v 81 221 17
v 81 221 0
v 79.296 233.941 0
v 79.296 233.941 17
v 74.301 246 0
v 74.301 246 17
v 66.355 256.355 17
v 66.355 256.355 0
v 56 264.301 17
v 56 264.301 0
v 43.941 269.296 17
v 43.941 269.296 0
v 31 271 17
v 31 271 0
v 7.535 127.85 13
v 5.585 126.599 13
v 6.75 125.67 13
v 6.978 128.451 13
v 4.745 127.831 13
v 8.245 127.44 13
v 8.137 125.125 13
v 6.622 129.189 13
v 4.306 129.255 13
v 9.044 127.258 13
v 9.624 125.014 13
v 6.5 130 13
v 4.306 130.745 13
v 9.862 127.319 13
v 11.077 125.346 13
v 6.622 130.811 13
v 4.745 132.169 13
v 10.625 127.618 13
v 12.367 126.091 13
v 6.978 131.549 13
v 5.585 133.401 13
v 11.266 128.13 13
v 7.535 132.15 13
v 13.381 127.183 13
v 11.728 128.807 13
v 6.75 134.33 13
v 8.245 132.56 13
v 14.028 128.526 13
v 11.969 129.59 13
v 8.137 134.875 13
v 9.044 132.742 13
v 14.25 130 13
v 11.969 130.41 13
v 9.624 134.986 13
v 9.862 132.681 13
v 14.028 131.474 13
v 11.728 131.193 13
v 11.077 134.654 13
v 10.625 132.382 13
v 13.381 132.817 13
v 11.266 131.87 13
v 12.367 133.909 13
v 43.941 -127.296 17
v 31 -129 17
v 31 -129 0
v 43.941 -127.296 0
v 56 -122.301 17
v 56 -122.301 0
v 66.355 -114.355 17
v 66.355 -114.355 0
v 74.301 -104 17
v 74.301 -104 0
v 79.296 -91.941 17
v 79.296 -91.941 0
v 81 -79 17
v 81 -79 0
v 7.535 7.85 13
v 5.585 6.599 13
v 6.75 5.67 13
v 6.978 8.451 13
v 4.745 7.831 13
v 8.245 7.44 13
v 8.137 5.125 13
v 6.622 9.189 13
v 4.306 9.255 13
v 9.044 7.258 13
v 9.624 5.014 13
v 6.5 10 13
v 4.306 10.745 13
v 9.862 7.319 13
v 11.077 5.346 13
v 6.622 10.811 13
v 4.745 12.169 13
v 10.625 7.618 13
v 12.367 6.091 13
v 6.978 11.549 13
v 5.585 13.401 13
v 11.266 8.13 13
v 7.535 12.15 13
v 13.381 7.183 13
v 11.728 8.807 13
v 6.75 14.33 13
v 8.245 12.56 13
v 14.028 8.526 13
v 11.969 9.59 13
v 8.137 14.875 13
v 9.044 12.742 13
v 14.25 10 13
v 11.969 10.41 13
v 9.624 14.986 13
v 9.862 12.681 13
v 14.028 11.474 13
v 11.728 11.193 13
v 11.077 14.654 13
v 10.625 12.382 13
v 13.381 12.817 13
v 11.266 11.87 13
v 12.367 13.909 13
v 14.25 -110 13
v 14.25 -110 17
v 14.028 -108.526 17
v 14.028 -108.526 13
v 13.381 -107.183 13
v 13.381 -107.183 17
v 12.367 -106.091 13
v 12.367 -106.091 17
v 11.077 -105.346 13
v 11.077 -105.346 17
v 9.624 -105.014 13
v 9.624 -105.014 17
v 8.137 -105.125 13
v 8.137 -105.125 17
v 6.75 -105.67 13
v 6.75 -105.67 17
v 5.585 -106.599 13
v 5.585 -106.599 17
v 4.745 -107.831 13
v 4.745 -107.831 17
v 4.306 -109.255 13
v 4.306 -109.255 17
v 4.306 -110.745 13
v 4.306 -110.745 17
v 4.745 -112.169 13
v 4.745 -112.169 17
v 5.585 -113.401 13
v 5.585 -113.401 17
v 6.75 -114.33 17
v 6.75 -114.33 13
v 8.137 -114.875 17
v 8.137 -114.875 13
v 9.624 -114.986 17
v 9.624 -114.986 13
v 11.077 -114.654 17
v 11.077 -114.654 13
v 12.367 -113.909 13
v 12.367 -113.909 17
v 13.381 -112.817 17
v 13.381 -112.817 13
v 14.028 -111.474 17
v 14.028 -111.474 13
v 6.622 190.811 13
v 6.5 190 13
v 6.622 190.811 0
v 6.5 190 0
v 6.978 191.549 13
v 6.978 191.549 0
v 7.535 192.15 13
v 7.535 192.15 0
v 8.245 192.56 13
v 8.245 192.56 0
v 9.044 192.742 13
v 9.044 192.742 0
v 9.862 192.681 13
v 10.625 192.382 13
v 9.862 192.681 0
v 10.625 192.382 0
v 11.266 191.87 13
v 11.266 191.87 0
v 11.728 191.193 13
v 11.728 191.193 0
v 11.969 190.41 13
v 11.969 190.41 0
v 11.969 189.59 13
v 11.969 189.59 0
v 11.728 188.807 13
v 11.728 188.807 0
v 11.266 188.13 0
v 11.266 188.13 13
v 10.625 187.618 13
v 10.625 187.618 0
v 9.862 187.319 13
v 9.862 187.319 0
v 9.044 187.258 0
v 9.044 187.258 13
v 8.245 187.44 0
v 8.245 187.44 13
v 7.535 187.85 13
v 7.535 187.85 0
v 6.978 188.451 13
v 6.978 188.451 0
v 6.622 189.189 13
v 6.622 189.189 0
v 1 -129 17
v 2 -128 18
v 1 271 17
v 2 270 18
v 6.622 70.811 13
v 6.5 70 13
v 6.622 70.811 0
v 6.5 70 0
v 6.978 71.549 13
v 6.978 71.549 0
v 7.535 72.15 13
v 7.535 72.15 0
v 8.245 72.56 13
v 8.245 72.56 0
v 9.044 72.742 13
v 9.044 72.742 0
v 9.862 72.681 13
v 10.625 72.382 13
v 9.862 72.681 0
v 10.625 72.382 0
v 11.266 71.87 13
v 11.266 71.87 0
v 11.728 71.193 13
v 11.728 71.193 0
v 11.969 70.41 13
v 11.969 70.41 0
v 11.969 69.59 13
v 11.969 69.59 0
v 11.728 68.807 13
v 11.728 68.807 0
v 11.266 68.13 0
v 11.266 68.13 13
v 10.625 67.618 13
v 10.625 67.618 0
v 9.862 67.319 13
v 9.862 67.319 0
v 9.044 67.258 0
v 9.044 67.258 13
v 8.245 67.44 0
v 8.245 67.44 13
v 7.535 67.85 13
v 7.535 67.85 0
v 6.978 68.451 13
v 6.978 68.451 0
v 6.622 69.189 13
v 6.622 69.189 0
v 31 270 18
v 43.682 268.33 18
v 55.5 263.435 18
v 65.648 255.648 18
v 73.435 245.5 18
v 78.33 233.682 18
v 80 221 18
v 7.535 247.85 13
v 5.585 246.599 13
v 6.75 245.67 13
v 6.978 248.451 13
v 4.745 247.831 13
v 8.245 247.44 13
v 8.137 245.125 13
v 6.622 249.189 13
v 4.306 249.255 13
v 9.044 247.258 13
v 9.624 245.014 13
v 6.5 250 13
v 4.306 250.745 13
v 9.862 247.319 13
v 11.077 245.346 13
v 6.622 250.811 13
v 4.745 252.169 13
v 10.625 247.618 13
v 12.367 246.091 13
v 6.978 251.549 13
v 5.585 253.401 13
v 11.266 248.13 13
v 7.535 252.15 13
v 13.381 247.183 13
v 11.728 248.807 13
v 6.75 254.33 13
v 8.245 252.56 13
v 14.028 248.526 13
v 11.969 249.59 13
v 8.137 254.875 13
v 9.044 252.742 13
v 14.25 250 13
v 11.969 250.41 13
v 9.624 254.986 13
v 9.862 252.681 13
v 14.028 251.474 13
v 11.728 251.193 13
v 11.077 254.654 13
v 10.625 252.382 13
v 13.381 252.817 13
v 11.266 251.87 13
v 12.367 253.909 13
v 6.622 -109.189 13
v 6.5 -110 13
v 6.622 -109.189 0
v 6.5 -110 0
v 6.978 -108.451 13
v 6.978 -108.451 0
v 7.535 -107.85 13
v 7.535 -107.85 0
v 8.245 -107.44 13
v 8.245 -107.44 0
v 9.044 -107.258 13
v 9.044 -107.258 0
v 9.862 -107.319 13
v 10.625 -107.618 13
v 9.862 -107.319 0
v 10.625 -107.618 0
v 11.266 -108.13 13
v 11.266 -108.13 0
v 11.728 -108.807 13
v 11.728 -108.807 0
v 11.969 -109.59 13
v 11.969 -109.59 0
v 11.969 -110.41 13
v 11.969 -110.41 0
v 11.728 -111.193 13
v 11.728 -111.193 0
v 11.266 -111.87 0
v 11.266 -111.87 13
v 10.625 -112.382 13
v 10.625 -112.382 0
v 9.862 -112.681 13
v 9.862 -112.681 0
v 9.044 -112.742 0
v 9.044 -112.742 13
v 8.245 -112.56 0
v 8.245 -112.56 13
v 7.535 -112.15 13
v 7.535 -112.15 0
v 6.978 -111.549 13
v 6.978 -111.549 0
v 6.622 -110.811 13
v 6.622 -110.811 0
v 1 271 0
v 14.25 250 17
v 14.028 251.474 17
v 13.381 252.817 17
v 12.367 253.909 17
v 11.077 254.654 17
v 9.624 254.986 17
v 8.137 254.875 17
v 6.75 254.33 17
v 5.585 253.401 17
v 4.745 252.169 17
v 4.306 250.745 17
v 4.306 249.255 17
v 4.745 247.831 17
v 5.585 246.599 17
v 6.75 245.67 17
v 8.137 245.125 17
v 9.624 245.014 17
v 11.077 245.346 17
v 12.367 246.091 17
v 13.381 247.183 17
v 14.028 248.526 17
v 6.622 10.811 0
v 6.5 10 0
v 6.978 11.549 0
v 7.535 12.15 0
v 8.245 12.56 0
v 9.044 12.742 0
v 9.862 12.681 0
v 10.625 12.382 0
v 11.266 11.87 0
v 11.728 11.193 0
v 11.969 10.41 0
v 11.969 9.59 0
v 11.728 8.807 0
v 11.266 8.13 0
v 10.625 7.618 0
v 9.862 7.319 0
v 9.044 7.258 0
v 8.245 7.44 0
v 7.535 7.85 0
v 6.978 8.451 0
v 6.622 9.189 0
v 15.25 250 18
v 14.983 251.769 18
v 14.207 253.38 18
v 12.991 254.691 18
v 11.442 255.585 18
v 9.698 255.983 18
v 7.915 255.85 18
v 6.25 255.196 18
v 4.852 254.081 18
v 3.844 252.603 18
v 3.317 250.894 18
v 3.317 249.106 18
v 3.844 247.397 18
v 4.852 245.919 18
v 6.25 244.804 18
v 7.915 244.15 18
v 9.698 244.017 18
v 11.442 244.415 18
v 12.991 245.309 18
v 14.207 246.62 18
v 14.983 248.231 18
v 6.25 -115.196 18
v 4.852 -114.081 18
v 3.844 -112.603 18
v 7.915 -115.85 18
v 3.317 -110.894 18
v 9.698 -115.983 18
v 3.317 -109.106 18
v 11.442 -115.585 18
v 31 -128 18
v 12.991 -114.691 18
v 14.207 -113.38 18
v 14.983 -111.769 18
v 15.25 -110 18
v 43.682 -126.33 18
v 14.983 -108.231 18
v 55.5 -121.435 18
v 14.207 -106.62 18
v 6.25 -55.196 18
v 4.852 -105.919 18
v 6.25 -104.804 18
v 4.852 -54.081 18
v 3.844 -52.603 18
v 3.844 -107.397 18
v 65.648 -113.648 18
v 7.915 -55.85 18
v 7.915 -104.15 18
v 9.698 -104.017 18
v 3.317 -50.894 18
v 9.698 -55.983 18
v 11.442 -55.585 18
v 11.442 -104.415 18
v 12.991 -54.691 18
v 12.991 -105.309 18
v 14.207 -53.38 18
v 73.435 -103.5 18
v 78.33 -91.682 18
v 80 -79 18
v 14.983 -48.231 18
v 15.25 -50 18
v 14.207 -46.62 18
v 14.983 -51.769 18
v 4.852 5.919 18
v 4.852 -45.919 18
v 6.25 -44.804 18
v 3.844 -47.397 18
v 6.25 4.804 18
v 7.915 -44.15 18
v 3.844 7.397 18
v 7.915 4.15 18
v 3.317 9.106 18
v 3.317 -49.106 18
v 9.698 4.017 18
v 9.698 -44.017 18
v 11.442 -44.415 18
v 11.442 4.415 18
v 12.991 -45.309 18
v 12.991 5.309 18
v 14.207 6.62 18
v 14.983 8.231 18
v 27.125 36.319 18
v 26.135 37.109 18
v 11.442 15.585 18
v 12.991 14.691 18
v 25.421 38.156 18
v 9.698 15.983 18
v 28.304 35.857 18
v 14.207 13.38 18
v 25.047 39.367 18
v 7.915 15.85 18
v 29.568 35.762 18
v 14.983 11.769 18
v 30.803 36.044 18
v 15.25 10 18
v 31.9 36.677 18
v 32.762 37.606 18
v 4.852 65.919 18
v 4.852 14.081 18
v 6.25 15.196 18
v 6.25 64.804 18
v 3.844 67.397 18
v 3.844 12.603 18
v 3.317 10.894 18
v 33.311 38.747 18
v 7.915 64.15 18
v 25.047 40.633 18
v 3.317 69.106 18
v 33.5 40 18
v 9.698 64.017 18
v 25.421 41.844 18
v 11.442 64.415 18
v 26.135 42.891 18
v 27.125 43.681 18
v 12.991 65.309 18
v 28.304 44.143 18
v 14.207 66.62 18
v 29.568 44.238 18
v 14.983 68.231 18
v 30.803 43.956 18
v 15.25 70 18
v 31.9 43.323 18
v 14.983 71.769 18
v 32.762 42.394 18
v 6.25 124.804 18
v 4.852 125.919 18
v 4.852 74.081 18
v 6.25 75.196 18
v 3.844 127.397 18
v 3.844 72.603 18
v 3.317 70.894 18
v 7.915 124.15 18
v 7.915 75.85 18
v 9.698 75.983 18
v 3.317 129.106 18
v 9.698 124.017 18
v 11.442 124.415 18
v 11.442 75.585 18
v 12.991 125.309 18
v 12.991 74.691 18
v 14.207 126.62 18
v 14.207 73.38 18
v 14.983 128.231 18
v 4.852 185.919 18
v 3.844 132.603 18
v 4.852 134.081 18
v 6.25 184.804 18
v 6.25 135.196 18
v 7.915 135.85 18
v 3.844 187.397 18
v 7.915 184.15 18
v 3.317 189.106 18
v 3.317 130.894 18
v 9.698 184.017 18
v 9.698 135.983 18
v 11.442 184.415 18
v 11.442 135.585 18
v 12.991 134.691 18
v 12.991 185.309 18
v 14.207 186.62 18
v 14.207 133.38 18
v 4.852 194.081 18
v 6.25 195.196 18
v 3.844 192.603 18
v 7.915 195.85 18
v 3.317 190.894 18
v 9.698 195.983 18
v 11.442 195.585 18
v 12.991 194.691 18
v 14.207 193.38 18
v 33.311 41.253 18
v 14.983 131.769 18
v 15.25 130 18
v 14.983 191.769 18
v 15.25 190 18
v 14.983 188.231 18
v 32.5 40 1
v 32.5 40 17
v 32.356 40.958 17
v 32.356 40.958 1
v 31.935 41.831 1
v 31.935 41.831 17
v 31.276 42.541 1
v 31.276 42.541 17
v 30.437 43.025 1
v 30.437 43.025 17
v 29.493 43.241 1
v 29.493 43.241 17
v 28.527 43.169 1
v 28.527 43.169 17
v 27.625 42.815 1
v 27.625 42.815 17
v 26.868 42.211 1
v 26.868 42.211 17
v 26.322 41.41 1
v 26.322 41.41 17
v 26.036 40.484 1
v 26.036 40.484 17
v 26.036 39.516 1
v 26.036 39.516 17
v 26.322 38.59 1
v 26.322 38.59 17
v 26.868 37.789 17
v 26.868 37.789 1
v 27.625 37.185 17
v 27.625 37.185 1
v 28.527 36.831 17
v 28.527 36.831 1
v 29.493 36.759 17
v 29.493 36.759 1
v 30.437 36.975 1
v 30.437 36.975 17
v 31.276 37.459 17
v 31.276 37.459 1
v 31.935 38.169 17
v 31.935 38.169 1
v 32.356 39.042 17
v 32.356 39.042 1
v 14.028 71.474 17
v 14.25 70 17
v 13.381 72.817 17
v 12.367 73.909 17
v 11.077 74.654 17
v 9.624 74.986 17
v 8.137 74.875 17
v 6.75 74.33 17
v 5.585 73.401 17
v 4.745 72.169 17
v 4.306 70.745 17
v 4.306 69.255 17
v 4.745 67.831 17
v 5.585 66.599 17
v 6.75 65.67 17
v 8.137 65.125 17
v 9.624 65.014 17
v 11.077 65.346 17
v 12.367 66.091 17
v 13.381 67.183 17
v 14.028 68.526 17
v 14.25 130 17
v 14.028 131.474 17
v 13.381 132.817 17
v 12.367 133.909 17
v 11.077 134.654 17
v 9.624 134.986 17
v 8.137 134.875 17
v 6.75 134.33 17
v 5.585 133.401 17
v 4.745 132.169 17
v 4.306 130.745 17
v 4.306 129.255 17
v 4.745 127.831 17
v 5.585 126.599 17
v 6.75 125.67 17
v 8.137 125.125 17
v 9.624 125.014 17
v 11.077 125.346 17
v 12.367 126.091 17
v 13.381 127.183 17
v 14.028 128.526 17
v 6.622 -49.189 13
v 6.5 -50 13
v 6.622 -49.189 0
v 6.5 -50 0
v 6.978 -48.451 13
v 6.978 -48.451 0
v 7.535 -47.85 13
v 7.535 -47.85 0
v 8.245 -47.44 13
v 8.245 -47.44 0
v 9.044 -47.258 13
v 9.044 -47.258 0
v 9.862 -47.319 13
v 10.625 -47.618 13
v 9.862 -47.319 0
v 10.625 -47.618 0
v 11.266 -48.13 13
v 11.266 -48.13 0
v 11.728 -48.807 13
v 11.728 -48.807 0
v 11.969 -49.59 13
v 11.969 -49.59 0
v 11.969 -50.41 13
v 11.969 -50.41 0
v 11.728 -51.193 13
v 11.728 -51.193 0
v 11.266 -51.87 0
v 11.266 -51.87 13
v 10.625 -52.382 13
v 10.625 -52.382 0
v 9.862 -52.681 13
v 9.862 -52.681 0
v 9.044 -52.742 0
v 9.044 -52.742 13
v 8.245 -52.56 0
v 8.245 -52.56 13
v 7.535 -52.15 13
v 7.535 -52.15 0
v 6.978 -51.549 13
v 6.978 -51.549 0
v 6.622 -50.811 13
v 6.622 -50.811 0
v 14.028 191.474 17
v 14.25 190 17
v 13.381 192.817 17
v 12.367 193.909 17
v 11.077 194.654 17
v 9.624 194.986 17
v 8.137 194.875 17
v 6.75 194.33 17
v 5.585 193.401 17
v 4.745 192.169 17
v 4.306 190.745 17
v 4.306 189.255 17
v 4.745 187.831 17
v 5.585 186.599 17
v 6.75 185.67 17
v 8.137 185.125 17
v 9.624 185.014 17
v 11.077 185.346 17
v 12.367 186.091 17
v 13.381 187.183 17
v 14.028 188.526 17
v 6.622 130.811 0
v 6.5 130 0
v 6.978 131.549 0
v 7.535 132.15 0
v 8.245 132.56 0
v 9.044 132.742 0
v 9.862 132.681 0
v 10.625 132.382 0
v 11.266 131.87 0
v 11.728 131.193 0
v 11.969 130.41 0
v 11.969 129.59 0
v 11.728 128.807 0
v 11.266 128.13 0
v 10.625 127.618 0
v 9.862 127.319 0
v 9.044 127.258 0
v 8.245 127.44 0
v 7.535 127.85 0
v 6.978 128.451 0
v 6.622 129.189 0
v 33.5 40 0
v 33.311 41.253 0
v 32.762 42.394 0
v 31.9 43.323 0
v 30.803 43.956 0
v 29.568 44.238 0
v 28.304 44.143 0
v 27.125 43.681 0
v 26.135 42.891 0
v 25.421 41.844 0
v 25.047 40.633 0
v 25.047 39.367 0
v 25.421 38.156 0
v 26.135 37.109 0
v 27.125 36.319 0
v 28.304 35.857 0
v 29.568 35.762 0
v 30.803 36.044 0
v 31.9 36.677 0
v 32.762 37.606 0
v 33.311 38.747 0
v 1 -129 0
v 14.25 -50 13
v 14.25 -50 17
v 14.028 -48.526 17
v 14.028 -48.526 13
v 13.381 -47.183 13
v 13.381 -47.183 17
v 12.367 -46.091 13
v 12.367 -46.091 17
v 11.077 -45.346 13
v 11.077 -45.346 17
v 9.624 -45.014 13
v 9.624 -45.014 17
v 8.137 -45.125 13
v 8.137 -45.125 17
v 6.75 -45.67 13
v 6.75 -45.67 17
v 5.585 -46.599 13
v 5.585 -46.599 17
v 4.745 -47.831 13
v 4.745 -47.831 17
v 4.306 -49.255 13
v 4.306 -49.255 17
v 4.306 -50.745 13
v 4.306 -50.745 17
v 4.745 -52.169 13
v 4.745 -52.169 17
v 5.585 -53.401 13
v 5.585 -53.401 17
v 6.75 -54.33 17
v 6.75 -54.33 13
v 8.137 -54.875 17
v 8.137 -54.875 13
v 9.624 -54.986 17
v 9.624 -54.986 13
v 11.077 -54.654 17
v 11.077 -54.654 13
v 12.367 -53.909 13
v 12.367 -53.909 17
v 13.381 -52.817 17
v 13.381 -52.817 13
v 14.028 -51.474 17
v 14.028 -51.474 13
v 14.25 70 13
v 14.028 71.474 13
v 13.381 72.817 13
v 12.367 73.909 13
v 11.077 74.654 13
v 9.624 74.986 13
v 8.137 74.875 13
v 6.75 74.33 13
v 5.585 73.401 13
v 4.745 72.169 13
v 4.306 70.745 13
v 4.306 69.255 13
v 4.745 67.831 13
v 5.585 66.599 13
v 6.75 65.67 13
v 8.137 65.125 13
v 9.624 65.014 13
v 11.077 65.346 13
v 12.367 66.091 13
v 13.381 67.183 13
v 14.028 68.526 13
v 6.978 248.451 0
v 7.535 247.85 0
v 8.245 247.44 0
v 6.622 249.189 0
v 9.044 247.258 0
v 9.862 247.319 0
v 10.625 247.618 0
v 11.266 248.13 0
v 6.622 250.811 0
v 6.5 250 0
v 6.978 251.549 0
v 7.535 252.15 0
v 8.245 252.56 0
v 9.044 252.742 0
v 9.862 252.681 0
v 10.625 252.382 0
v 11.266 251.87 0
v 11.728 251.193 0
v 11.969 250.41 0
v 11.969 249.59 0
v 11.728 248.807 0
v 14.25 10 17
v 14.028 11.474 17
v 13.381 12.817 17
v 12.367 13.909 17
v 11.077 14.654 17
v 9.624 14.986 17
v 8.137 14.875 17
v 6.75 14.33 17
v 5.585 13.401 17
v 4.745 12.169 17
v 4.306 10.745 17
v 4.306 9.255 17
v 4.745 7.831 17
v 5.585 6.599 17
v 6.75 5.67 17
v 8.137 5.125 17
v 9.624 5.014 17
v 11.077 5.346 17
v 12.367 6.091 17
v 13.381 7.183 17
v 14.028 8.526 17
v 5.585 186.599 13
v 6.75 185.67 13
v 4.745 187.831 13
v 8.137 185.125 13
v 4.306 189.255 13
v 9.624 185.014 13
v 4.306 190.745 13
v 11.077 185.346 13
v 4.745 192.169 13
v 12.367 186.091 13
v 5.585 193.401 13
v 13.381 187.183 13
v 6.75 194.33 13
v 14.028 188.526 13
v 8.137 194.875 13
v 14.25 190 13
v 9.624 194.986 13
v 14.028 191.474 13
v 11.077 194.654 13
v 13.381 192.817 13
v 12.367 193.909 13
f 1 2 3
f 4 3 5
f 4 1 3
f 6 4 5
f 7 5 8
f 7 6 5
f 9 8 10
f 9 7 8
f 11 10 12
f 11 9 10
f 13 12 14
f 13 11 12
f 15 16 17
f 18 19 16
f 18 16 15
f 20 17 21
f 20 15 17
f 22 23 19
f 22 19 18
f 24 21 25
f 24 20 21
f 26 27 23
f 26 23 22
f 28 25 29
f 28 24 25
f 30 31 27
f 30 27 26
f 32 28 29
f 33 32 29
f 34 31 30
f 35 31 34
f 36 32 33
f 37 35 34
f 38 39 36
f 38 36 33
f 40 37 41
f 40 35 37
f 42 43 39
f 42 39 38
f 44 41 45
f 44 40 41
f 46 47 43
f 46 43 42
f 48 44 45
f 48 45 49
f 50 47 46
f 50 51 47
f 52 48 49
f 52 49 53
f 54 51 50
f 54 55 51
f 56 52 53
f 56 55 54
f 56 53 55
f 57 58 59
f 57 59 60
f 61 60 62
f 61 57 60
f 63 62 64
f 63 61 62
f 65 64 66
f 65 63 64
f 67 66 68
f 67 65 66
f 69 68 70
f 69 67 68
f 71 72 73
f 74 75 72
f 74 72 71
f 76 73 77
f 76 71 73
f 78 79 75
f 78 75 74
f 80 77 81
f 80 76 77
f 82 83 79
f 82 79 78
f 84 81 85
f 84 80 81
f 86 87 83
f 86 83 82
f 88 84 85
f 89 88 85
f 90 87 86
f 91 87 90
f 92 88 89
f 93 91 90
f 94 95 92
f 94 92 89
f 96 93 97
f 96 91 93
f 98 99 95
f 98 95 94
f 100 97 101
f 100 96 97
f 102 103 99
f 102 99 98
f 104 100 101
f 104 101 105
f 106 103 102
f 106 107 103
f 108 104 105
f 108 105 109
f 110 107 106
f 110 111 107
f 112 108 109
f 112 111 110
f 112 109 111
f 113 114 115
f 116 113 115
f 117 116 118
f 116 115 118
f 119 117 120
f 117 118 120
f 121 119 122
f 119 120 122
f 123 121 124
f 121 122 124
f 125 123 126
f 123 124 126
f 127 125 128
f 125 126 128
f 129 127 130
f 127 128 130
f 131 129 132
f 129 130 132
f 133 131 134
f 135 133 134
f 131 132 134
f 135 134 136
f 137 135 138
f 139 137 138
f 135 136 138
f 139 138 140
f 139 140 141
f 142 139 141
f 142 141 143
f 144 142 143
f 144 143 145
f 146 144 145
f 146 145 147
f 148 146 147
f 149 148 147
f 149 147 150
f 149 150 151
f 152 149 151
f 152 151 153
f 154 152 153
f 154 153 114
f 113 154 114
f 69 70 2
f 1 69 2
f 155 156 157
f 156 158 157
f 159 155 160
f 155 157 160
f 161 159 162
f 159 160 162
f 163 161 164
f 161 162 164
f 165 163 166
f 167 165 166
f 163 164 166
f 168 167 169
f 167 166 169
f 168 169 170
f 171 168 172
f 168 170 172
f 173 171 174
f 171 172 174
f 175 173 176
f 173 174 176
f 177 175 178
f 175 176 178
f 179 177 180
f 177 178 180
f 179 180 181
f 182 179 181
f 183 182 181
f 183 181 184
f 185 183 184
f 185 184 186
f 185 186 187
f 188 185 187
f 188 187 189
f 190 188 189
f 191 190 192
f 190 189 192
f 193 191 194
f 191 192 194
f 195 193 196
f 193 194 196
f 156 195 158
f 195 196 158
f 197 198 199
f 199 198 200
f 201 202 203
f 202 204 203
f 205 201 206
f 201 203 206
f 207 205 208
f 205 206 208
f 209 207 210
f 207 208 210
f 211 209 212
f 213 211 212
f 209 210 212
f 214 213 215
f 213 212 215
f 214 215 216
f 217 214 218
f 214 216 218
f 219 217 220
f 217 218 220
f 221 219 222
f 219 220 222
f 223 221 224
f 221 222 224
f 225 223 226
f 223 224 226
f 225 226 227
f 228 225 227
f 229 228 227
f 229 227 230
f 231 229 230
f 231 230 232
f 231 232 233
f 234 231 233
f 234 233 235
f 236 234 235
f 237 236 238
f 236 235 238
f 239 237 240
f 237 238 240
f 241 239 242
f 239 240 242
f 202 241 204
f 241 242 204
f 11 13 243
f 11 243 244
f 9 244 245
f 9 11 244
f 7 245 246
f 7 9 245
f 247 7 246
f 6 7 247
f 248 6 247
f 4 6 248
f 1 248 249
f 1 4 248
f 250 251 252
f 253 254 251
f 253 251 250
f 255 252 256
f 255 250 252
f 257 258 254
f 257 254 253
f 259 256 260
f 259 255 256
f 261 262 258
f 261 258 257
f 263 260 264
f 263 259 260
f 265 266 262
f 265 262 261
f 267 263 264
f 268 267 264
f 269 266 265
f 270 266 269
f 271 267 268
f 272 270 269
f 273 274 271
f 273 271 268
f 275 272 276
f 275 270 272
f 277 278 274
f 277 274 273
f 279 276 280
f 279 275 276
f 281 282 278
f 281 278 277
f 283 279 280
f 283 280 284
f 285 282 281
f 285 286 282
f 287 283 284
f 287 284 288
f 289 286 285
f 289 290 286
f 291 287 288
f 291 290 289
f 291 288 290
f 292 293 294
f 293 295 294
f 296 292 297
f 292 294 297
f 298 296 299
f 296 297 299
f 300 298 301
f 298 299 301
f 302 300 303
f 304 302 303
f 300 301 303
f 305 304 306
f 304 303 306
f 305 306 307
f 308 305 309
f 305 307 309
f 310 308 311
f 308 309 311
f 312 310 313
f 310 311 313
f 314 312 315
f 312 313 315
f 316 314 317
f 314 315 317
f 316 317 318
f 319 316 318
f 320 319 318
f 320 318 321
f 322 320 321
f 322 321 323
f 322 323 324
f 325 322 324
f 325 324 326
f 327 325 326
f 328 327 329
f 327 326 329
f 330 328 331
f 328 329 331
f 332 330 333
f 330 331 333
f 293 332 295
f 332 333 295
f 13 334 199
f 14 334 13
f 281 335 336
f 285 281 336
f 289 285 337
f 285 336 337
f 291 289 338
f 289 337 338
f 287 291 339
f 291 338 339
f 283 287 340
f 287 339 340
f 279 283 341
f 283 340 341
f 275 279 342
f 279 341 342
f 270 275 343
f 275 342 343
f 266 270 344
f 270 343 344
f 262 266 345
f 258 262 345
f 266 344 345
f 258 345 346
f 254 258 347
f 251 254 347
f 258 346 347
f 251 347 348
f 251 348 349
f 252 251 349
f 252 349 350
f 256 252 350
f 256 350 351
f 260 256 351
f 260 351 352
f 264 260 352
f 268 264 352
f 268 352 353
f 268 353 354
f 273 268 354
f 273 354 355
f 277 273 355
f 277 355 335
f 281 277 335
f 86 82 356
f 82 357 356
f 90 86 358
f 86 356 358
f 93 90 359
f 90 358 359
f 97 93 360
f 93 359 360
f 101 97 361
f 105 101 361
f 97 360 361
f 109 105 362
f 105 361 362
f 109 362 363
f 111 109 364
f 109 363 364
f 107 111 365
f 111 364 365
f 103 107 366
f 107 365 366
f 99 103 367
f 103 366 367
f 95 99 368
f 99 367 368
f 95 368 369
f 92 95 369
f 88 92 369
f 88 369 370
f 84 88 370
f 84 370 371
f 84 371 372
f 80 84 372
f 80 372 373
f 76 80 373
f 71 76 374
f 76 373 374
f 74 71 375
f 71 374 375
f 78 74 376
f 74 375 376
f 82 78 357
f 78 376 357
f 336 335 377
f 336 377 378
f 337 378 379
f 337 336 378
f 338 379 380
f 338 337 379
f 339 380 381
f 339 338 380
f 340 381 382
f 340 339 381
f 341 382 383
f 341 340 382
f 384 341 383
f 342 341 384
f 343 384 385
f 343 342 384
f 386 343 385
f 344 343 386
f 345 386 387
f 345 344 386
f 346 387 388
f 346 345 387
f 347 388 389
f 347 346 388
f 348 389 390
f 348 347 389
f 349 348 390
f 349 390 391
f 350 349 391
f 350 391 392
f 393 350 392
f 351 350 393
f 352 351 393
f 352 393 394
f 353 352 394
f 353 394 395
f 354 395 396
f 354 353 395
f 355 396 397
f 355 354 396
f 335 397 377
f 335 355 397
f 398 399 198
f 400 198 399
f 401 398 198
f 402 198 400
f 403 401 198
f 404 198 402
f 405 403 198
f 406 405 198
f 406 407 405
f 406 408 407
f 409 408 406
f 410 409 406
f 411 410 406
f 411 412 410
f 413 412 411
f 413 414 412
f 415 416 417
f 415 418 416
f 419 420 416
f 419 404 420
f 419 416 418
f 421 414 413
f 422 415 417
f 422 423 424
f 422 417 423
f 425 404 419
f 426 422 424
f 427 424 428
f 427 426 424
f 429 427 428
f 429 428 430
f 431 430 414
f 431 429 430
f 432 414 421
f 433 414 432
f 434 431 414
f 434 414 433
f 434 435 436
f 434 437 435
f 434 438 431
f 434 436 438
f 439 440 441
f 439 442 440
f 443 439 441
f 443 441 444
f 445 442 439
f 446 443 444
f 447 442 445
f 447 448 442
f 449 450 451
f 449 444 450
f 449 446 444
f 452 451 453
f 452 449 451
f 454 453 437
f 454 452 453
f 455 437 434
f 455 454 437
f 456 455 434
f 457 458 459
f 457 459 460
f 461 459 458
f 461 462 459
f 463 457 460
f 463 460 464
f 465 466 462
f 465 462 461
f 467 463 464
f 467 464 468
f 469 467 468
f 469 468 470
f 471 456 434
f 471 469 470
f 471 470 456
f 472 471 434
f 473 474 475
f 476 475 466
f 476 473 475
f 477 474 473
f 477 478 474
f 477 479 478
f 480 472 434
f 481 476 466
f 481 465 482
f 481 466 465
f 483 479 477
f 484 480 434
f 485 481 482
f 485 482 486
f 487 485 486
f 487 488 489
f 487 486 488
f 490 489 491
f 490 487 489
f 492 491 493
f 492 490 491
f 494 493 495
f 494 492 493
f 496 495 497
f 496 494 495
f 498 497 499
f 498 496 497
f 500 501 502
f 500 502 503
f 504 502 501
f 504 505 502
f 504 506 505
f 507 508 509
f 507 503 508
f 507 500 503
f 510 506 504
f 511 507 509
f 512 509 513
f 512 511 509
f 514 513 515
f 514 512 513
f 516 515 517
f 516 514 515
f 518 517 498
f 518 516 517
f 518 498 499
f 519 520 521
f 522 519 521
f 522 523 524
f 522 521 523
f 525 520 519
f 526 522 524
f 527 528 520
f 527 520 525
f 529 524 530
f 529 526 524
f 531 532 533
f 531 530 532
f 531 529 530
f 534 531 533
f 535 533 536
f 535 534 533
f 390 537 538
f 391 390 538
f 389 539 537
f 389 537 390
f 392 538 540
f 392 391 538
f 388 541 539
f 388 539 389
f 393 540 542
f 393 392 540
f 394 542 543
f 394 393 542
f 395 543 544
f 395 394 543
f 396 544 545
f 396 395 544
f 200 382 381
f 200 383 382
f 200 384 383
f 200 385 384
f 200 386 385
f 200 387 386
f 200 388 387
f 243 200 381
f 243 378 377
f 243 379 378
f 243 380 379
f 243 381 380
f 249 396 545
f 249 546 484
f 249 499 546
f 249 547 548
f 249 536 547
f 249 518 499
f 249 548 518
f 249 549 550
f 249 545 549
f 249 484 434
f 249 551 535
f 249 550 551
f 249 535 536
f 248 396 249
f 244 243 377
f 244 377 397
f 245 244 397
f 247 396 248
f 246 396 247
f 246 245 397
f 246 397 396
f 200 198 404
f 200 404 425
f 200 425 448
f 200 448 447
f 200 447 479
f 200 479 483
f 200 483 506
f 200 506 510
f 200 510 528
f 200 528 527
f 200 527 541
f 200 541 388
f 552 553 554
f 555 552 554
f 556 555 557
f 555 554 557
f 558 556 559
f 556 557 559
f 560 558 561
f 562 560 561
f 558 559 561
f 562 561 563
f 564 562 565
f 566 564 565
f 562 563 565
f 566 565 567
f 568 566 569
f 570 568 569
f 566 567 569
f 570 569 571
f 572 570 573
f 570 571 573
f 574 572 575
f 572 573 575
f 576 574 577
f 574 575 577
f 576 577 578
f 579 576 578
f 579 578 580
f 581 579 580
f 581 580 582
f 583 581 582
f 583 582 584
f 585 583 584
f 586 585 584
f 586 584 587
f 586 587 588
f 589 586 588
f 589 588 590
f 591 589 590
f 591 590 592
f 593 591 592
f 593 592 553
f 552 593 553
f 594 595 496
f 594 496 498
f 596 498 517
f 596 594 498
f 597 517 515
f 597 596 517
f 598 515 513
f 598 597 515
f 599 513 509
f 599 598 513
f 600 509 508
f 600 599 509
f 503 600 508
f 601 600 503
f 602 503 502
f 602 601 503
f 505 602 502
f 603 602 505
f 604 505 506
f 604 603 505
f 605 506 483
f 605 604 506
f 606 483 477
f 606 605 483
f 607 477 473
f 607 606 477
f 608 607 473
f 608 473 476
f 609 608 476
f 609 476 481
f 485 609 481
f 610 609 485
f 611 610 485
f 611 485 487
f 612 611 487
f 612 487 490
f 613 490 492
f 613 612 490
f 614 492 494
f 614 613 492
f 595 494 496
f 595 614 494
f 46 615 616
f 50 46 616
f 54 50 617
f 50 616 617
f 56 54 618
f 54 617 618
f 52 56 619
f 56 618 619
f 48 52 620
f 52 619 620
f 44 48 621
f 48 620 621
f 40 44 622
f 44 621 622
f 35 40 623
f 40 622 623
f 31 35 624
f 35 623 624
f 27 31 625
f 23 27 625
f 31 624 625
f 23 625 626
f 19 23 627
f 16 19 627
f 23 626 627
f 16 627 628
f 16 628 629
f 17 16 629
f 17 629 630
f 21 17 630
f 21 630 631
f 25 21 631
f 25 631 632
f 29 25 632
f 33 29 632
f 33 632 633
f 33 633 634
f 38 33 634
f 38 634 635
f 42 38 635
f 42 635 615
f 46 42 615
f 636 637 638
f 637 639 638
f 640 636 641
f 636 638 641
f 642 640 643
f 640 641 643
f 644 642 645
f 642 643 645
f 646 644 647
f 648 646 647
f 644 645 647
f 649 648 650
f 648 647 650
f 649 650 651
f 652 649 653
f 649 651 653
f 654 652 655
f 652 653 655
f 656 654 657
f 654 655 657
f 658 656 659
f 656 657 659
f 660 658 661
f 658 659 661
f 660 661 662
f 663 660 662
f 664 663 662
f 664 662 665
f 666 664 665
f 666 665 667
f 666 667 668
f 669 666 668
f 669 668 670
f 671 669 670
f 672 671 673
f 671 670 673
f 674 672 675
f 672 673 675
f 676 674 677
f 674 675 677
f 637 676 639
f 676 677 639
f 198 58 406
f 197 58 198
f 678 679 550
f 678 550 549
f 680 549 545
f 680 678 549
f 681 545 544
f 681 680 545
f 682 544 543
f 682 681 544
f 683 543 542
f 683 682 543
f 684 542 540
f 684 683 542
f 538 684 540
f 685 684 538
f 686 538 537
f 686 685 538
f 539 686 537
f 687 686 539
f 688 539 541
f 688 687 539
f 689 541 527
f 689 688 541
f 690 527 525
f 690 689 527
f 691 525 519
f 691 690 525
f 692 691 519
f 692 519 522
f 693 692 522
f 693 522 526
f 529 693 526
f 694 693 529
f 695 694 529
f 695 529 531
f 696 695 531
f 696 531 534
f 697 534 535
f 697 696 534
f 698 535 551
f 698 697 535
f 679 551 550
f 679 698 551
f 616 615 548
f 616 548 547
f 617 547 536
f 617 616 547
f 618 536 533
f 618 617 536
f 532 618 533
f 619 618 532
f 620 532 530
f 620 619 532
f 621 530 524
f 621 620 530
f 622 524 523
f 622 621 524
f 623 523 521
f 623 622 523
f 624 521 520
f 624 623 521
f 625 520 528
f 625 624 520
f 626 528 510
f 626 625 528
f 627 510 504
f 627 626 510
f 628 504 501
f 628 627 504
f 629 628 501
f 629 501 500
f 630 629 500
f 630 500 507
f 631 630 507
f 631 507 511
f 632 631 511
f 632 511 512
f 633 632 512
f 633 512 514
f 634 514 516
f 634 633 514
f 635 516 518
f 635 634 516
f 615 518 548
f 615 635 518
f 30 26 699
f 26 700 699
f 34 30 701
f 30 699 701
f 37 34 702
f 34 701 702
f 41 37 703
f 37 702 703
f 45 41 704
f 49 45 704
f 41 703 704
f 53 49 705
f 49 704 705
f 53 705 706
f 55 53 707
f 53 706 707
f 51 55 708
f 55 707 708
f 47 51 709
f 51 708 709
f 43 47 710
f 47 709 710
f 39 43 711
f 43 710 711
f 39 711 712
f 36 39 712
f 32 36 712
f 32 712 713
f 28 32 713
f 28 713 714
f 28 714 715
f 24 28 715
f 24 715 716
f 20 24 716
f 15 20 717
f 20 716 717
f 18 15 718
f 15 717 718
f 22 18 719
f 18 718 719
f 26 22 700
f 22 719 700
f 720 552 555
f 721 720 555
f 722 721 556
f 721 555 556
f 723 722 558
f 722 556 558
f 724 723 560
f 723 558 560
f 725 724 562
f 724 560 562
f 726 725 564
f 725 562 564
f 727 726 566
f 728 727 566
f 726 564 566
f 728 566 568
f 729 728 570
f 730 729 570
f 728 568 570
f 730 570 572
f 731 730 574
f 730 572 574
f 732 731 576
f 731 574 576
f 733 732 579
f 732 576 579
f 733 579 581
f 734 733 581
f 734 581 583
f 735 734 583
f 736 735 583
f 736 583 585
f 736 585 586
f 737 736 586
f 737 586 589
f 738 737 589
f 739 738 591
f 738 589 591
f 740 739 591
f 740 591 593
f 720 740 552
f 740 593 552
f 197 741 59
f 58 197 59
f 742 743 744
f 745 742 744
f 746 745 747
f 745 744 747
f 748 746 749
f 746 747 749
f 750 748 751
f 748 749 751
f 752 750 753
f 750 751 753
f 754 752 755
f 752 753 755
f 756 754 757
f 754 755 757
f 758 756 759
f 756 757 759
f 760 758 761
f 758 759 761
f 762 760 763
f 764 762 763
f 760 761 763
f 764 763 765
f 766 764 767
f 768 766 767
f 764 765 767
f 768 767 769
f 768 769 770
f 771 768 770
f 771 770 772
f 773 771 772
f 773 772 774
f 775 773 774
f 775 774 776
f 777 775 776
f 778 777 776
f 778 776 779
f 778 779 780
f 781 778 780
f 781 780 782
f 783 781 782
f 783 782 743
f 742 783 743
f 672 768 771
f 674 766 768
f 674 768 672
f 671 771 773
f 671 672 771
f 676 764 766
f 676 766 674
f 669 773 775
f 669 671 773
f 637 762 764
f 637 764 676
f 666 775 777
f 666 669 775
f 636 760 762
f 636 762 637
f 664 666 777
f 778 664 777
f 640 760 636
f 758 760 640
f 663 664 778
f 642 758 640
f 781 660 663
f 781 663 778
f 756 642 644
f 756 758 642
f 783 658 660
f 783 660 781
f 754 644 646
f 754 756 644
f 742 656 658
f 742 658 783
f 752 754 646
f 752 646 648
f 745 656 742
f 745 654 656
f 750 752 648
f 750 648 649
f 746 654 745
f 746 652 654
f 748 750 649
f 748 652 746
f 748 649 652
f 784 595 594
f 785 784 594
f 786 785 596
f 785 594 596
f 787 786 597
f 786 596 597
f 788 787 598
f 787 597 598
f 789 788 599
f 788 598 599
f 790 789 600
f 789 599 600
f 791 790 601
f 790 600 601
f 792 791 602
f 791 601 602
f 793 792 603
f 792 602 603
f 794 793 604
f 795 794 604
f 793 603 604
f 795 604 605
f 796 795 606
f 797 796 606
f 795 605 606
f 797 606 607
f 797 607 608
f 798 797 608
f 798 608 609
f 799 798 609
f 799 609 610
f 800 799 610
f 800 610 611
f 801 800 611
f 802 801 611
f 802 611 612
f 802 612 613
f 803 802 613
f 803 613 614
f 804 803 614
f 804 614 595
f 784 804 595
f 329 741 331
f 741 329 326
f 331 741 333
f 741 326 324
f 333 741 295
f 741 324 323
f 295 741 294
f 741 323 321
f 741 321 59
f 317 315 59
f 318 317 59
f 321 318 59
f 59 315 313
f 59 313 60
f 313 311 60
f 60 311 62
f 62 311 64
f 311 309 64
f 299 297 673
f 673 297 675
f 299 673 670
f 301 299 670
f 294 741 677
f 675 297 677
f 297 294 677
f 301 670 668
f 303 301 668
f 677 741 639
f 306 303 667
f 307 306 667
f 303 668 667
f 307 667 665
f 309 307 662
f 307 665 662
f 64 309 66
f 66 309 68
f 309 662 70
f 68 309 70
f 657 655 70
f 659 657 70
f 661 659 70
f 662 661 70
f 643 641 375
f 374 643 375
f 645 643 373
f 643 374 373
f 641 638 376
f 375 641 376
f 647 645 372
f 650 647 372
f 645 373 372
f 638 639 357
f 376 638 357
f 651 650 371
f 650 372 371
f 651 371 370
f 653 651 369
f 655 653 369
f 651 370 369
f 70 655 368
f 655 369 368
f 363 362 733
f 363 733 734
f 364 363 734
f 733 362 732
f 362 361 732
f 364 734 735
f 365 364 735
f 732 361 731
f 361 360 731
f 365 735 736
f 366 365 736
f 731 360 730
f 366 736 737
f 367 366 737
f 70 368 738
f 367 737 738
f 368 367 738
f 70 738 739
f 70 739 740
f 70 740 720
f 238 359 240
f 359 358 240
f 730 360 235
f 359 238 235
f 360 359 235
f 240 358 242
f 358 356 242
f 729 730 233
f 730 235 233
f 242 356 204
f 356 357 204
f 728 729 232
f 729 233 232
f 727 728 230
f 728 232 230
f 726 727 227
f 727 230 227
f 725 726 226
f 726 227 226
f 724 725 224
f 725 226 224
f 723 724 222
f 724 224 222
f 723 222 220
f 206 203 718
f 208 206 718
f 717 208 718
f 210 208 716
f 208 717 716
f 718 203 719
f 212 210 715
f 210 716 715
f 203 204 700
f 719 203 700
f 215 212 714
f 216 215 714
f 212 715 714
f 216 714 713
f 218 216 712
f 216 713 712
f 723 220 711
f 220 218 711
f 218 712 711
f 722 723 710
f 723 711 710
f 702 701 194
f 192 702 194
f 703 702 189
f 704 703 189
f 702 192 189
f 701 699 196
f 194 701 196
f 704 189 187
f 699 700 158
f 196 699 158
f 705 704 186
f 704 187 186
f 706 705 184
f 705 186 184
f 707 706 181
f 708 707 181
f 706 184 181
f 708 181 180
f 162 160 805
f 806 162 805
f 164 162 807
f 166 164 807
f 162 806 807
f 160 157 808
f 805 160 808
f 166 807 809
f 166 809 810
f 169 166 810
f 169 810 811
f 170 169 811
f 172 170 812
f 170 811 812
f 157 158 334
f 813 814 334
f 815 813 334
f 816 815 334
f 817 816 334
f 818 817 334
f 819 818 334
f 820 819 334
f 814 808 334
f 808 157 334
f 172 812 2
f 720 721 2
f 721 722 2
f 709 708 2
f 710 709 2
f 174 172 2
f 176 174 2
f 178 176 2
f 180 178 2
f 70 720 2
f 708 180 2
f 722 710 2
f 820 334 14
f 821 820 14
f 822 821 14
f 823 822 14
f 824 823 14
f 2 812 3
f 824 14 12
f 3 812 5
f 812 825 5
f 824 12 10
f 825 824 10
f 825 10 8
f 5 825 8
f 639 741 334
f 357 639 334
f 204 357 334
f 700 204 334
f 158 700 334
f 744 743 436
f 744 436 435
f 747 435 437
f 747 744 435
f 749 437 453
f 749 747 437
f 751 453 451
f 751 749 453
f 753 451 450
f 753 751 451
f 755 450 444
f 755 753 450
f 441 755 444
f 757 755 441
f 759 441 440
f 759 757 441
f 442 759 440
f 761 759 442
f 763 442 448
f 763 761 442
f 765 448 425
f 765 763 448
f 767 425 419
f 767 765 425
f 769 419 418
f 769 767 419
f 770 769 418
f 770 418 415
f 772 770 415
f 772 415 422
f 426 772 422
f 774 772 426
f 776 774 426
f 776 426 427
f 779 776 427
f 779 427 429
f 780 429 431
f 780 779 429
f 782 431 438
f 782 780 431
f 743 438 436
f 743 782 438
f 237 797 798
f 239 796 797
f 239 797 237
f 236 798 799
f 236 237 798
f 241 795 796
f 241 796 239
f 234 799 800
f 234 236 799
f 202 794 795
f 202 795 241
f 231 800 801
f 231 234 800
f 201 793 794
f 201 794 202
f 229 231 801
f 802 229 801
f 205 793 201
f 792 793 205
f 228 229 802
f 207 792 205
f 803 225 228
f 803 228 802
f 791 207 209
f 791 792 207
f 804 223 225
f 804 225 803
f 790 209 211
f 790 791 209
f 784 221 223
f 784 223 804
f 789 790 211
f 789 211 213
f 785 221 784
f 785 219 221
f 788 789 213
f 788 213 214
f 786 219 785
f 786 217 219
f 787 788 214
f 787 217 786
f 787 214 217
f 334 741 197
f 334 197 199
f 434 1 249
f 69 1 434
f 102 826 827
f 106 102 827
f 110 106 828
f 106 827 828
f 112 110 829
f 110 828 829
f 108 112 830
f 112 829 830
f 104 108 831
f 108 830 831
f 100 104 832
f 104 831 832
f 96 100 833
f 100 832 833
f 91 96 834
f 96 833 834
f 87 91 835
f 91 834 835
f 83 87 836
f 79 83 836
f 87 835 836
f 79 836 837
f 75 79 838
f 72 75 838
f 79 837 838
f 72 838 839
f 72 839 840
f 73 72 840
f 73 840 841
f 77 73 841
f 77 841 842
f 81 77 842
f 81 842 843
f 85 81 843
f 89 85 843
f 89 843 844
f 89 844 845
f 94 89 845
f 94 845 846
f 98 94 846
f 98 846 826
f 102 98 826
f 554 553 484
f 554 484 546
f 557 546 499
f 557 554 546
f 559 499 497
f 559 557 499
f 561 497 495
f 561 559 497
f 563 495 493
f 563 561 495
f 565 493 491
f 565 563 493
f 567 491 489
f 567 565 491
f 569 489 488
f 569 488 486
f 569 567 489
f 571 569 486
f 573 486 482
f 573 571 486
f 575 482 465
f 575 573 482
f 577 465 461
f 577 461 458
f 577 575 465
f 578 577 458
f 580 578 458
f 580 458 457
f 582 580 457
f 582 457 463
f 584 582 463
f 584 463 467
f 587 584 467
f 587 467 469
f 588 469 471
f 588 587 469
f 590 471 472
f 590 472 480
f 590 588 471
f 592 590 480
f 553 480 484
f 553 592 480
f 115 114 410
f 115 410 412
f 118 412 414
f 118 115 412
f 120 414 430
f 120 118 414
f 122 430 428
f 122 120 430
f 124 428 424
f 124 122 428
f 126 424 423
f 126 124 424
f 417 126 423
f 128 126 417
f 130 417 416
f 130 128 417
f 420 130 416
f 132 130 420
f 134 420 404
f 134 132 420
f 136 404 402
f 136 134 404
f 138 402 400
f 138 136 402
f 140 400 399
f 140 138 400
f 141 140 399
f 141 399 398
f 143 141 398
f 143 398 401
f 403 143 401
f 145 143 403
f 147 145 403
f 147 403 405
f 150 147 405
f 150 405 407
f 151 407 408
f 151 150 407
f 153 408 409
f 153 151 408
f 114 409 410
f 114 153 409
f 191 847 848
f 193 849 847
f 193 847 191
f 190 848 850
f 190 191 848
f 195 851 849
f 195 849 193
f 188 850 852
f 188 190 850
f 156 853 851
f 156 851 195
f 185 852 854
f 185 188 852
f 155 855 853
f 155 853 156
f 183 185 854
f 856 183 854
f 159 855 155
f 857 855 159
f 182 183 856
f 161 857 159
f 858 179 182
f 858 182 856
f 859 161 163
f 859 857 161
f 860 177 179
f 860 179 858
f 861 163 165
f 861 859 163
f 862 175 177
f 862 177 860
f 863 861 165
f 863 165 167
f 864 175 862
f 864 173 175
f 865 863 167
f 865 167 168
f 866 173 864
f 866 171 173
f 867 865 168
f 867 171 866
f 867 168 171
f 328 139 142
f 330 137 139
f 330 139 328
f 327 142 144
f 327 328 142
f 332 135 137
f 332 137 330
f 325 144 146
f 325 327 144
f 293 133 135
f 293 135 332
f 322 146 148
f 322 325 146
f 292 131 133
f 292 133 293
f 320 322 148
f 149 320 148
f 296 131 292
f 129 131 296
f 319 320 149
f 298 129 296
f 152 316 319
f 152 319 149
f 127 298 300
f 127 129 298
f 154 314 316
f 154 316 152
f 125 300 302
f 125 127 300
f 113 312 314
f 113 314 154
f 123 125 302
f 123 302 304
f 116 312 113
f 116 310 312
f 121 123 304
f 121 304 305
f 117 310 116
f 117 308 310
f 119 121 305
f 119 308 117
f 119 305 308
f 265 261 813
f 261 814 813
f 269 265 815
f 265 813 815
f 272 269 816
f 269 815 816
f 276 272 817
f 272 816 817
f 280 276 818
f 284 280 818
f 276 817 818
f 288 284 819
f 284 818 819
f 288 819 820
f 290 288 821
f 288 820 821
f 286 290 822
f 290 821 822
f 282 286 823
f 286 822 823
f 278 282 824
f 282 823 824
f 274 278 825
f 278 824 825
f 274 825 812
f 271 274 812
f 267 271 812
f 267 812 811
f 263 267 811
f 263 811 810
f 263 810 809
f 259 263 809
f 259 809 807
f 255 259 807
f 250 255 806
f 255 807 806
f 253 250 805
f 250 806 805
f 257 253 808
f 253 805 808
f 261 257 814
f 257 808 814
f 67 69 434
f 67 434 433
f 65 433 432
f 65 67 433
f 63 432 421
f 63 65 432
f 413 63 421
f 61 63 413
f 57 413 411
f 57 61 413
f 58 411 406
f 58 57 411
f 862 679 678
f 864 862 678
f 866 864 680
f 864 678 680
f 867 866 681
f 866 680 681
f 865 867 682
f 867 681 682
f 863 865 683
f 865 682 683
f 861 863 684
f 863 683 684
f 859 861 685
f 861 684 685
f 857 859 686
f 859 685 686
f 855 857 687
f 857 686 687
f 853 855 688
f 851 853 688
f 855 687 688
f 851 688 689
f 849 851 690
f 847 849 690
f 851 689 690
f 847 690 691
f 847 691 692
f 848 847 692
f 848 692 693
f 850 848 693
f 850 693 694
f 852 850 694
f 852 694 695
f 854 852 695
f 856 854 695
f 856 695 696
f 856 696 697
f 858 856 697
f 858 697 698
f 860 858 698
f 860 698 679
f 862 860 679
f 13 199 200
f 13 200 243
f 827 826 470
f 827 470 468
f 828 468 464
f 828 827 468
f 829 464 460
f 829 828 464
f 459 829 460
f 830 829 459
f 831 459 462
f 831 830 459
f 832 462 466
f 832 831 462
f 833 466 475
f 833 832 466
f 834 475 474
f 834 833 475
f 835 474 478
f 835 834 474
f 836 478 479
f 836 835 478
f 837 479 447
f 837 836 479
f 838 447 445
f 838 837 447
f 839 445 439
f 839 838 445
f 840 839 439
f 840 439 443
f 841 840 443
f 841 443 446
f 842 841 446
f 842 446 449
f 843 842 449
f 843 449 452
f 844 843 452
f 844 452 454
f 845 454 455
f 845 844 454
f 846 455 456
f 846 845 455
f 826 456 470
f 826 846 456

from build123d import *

# Parameters (mm, degrees)
SKETCH1_W                      = 80
SKETCH1_H                      = 400
BOSS_EXTRUDE1_DEPTH            = 18
FILLET1_R                      = 50
CBORE_FOR_M5_SHCS1_D           = 5.5
CBORE_FOR_M5_SHCS1_DEPTH       = 28.347633298
CBORE_FOR_M5_SHCS1_CBORE_D     = 10
CBORE_FOR_M5_SHCS1_CBORE_DEPTH = 5
CBORE_FOR_M5_SHCS1_TIP         = 1.652366702
CHAMFER1_SIZE                  = 1
SKETCH5_R                      = 3.25
CUT_EXTRUDE1_DEPTH             = 284.418418597
CHAMFER2_SIZE                  = 1


with BuildPart() as part:
    # Sketch1 → Boss-Extrude1 (new body)
    with BuildSketch(Plane.XY):
        with Locations((41, 71)):
            Rectangle(SKETCH1_W, SKETCH1_H)
    extrude(amount=BOSS_EXTRUDE1_DEPTH)

    # Fillet1
    fillet1_edges = [part.edges().sort_by_distance(p)[0] for p in [
        (81, 271, 9),
        (81, -129, 9),
    ]]
    fillet(fillet1_edges, radius=FILLET1_R)

    # CBORE for M5 SHCS1
    with Locations(Plane.XY.offset(18)):
        with Locations((9.25, 190), (9.25, 130), (9.25, 70), (9.25, 10), (9.25, -50), (9.25, -110), (9.25, 250)):
            CounterBoreHole(CBORE_FOR_M5_SHCS1_D / 2, CBORE_FOR_M5_SHCS1_CBORE_D / 2, CBORE_FOR_M5_SHCS1_CBORE_DEPTH, depth=CBORE_FOR_M5_SHCS1_DEPTH)
            with Locations((0, 0, -(CBORE_FOR_M5_SHCS1_DEPTH + CBORE_FOR_M5_SHCS1_TIP / 2))):  # 118° drill point
                Cone(0, CBORE_FOR_M5_SHCS1_D / 2, CBORE_FOR_M5_SHCS1_TIP, mode=Mode.SUBTRACT)

    # Chamfer1
    chamfer1_edges = [part.edges().sort_by_distance(p)[0] for p in [
        (16, 271, 18),
        (81, 71, 18),
        (66.355339059, -114.355339059, 18),
        (66.355339059, 256.355339059, 18),
        (4.25, 250, 18),
        (4.25, -110, 18),
        (4.25, -50, 18),
        (1, 71, 18),
        (4.25, 10, 18),
        (4.25, 70, 18),
        (4.25, 130, 18),
        (4.25, 190, 18),
        (16, -129, 18),
    ]]
    chamfer(chamfer1_edges, length=CHAMFER1_SIZE)

    # Sketch5 → Cut-Extrude1 (cut, through all)
    with BuildSketch(Plane.XY.offset(18)):
        with Locations((29.25, 40)):
            Circle(SKETCH5_R)
    extrude(amount=-CUT_EXTRUDE1_DEPTH, mode=Mode.SUBTRACT)

    # Chamfer2
    chamfer2_edges = [part.edges().sort_by_distance(p)[0] for p in [
        (26, 40, 0),
        (26, 40, 18),
    ]]
    chamfer(chamfer2_edges, length=CHAMFER2_SIZE)


solid = part.part
